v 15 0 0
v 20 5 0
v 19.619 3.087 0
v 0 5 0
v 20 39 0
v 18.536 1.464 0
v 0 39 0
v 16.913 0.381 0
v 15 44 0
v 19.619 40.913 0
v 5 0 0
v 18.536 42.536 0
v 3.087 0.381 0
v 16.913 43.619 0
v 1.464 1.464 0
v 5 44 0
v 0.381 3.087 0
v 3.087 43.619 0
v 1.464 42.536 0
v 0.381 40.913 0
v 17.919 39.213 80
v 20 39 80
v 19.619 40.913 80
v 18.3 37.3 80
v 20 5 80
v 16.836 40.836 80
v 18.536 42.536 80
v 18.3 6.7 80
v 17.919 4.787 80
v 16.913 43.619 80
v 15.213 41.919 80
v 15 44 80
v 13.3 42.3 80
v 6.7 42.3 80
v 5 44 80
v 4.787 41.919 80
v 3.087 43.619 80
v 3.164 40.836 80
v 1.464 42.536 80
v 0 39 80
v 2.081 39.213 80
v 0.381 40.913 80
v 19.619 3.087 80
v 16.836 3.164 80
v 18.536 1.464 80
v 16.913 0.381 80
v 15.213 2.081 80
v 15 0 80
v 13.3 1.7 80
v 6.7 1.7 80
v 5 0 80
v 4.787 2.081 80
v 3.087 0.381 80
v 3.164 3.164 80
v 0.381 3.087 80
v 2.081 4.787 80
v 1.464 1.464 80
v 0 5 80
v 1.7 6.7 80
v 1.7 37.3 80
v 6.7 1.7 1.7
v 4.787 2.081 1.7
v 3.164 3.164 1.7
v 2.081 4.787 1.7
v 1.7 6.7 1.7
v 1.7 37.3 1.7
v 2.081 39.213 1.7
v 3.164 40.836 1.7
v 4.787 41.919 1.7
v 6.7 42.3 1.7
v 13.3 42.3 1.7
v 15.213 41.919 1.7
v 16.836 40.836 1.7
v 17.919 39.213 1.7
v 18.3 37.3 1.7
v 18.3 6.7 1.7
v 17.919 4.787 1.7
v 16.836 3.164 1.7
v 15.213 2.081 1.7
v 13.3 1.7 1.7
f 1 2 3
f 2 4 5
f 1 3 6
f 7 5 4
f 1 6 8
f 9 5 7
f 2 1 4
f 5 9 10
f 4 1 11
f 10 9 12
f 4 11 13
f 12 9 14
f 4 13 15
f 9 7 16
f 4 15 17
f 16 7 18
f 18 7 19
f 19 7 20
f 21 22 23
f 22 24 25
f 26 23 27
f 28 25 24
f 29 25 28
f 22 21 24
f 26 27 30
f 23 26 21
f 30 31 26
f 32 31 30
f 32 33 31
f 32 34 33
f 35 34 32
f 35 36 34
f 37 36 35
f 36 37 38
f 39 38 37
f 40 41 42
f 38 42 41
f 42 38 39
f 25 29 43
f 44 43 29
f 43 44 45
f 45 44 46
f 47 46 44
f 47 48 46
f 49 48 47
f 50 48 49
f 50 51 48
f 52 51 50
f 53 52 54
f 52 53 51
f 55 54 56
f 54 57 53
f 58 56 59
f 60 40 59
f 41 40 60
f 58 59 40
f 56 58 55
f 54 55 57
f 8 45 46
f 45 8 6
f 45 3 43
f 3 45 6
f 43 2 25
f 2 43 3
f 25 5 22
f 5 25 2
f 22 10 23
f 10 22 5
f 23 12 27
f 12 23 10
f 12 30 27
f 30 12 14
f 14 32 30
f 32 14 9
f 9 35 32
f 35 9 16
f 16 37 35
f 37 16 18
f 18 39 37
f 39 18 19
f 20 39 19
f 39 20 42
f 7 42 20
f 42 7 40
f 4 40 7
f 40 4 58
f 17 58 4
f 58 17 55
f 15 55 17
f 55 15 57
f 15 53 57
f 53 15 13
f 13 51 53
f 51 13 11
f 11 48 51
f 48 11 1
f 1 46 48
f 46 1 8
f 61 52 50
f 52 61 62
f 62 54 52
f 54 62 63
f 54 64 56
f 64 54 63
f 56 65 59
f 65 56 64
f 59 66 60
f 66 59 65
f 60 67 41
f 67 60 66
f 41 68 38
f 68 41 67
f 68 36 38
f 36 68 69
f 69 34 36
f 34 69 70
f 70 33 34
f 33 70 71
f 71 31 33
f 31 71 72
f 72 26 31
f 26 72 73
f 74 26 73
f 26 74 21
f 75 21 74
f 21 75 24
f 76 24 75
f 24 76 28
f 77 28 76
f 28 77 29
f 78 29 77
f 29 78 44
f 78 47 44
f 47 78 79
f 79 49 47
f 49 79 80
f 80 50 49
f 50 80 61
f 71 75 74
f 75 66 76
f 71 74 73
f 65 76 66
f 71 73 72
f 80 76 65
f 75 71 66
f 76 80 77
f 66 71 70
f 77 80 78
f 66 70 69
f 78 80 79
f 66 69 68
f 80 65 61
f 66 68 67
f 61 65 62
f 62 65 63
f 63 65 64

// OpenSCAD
thick = 1.7;
height = 80;
width = 44;

linear_extrude(height){
    difference(){
        union(){
            offset(5)offset(-5)
                square([20, width]);
        }
        union(){
            translate([thick, thick, 0])
                offset(5)offset(-5)
                    square([20 - thick * 2, 44 - thick * 2]);
        }
    }
}

linear_extrude(thick){
    union(){
        offset(5)offset(-5)
            square([20, width]);
    }    
}
